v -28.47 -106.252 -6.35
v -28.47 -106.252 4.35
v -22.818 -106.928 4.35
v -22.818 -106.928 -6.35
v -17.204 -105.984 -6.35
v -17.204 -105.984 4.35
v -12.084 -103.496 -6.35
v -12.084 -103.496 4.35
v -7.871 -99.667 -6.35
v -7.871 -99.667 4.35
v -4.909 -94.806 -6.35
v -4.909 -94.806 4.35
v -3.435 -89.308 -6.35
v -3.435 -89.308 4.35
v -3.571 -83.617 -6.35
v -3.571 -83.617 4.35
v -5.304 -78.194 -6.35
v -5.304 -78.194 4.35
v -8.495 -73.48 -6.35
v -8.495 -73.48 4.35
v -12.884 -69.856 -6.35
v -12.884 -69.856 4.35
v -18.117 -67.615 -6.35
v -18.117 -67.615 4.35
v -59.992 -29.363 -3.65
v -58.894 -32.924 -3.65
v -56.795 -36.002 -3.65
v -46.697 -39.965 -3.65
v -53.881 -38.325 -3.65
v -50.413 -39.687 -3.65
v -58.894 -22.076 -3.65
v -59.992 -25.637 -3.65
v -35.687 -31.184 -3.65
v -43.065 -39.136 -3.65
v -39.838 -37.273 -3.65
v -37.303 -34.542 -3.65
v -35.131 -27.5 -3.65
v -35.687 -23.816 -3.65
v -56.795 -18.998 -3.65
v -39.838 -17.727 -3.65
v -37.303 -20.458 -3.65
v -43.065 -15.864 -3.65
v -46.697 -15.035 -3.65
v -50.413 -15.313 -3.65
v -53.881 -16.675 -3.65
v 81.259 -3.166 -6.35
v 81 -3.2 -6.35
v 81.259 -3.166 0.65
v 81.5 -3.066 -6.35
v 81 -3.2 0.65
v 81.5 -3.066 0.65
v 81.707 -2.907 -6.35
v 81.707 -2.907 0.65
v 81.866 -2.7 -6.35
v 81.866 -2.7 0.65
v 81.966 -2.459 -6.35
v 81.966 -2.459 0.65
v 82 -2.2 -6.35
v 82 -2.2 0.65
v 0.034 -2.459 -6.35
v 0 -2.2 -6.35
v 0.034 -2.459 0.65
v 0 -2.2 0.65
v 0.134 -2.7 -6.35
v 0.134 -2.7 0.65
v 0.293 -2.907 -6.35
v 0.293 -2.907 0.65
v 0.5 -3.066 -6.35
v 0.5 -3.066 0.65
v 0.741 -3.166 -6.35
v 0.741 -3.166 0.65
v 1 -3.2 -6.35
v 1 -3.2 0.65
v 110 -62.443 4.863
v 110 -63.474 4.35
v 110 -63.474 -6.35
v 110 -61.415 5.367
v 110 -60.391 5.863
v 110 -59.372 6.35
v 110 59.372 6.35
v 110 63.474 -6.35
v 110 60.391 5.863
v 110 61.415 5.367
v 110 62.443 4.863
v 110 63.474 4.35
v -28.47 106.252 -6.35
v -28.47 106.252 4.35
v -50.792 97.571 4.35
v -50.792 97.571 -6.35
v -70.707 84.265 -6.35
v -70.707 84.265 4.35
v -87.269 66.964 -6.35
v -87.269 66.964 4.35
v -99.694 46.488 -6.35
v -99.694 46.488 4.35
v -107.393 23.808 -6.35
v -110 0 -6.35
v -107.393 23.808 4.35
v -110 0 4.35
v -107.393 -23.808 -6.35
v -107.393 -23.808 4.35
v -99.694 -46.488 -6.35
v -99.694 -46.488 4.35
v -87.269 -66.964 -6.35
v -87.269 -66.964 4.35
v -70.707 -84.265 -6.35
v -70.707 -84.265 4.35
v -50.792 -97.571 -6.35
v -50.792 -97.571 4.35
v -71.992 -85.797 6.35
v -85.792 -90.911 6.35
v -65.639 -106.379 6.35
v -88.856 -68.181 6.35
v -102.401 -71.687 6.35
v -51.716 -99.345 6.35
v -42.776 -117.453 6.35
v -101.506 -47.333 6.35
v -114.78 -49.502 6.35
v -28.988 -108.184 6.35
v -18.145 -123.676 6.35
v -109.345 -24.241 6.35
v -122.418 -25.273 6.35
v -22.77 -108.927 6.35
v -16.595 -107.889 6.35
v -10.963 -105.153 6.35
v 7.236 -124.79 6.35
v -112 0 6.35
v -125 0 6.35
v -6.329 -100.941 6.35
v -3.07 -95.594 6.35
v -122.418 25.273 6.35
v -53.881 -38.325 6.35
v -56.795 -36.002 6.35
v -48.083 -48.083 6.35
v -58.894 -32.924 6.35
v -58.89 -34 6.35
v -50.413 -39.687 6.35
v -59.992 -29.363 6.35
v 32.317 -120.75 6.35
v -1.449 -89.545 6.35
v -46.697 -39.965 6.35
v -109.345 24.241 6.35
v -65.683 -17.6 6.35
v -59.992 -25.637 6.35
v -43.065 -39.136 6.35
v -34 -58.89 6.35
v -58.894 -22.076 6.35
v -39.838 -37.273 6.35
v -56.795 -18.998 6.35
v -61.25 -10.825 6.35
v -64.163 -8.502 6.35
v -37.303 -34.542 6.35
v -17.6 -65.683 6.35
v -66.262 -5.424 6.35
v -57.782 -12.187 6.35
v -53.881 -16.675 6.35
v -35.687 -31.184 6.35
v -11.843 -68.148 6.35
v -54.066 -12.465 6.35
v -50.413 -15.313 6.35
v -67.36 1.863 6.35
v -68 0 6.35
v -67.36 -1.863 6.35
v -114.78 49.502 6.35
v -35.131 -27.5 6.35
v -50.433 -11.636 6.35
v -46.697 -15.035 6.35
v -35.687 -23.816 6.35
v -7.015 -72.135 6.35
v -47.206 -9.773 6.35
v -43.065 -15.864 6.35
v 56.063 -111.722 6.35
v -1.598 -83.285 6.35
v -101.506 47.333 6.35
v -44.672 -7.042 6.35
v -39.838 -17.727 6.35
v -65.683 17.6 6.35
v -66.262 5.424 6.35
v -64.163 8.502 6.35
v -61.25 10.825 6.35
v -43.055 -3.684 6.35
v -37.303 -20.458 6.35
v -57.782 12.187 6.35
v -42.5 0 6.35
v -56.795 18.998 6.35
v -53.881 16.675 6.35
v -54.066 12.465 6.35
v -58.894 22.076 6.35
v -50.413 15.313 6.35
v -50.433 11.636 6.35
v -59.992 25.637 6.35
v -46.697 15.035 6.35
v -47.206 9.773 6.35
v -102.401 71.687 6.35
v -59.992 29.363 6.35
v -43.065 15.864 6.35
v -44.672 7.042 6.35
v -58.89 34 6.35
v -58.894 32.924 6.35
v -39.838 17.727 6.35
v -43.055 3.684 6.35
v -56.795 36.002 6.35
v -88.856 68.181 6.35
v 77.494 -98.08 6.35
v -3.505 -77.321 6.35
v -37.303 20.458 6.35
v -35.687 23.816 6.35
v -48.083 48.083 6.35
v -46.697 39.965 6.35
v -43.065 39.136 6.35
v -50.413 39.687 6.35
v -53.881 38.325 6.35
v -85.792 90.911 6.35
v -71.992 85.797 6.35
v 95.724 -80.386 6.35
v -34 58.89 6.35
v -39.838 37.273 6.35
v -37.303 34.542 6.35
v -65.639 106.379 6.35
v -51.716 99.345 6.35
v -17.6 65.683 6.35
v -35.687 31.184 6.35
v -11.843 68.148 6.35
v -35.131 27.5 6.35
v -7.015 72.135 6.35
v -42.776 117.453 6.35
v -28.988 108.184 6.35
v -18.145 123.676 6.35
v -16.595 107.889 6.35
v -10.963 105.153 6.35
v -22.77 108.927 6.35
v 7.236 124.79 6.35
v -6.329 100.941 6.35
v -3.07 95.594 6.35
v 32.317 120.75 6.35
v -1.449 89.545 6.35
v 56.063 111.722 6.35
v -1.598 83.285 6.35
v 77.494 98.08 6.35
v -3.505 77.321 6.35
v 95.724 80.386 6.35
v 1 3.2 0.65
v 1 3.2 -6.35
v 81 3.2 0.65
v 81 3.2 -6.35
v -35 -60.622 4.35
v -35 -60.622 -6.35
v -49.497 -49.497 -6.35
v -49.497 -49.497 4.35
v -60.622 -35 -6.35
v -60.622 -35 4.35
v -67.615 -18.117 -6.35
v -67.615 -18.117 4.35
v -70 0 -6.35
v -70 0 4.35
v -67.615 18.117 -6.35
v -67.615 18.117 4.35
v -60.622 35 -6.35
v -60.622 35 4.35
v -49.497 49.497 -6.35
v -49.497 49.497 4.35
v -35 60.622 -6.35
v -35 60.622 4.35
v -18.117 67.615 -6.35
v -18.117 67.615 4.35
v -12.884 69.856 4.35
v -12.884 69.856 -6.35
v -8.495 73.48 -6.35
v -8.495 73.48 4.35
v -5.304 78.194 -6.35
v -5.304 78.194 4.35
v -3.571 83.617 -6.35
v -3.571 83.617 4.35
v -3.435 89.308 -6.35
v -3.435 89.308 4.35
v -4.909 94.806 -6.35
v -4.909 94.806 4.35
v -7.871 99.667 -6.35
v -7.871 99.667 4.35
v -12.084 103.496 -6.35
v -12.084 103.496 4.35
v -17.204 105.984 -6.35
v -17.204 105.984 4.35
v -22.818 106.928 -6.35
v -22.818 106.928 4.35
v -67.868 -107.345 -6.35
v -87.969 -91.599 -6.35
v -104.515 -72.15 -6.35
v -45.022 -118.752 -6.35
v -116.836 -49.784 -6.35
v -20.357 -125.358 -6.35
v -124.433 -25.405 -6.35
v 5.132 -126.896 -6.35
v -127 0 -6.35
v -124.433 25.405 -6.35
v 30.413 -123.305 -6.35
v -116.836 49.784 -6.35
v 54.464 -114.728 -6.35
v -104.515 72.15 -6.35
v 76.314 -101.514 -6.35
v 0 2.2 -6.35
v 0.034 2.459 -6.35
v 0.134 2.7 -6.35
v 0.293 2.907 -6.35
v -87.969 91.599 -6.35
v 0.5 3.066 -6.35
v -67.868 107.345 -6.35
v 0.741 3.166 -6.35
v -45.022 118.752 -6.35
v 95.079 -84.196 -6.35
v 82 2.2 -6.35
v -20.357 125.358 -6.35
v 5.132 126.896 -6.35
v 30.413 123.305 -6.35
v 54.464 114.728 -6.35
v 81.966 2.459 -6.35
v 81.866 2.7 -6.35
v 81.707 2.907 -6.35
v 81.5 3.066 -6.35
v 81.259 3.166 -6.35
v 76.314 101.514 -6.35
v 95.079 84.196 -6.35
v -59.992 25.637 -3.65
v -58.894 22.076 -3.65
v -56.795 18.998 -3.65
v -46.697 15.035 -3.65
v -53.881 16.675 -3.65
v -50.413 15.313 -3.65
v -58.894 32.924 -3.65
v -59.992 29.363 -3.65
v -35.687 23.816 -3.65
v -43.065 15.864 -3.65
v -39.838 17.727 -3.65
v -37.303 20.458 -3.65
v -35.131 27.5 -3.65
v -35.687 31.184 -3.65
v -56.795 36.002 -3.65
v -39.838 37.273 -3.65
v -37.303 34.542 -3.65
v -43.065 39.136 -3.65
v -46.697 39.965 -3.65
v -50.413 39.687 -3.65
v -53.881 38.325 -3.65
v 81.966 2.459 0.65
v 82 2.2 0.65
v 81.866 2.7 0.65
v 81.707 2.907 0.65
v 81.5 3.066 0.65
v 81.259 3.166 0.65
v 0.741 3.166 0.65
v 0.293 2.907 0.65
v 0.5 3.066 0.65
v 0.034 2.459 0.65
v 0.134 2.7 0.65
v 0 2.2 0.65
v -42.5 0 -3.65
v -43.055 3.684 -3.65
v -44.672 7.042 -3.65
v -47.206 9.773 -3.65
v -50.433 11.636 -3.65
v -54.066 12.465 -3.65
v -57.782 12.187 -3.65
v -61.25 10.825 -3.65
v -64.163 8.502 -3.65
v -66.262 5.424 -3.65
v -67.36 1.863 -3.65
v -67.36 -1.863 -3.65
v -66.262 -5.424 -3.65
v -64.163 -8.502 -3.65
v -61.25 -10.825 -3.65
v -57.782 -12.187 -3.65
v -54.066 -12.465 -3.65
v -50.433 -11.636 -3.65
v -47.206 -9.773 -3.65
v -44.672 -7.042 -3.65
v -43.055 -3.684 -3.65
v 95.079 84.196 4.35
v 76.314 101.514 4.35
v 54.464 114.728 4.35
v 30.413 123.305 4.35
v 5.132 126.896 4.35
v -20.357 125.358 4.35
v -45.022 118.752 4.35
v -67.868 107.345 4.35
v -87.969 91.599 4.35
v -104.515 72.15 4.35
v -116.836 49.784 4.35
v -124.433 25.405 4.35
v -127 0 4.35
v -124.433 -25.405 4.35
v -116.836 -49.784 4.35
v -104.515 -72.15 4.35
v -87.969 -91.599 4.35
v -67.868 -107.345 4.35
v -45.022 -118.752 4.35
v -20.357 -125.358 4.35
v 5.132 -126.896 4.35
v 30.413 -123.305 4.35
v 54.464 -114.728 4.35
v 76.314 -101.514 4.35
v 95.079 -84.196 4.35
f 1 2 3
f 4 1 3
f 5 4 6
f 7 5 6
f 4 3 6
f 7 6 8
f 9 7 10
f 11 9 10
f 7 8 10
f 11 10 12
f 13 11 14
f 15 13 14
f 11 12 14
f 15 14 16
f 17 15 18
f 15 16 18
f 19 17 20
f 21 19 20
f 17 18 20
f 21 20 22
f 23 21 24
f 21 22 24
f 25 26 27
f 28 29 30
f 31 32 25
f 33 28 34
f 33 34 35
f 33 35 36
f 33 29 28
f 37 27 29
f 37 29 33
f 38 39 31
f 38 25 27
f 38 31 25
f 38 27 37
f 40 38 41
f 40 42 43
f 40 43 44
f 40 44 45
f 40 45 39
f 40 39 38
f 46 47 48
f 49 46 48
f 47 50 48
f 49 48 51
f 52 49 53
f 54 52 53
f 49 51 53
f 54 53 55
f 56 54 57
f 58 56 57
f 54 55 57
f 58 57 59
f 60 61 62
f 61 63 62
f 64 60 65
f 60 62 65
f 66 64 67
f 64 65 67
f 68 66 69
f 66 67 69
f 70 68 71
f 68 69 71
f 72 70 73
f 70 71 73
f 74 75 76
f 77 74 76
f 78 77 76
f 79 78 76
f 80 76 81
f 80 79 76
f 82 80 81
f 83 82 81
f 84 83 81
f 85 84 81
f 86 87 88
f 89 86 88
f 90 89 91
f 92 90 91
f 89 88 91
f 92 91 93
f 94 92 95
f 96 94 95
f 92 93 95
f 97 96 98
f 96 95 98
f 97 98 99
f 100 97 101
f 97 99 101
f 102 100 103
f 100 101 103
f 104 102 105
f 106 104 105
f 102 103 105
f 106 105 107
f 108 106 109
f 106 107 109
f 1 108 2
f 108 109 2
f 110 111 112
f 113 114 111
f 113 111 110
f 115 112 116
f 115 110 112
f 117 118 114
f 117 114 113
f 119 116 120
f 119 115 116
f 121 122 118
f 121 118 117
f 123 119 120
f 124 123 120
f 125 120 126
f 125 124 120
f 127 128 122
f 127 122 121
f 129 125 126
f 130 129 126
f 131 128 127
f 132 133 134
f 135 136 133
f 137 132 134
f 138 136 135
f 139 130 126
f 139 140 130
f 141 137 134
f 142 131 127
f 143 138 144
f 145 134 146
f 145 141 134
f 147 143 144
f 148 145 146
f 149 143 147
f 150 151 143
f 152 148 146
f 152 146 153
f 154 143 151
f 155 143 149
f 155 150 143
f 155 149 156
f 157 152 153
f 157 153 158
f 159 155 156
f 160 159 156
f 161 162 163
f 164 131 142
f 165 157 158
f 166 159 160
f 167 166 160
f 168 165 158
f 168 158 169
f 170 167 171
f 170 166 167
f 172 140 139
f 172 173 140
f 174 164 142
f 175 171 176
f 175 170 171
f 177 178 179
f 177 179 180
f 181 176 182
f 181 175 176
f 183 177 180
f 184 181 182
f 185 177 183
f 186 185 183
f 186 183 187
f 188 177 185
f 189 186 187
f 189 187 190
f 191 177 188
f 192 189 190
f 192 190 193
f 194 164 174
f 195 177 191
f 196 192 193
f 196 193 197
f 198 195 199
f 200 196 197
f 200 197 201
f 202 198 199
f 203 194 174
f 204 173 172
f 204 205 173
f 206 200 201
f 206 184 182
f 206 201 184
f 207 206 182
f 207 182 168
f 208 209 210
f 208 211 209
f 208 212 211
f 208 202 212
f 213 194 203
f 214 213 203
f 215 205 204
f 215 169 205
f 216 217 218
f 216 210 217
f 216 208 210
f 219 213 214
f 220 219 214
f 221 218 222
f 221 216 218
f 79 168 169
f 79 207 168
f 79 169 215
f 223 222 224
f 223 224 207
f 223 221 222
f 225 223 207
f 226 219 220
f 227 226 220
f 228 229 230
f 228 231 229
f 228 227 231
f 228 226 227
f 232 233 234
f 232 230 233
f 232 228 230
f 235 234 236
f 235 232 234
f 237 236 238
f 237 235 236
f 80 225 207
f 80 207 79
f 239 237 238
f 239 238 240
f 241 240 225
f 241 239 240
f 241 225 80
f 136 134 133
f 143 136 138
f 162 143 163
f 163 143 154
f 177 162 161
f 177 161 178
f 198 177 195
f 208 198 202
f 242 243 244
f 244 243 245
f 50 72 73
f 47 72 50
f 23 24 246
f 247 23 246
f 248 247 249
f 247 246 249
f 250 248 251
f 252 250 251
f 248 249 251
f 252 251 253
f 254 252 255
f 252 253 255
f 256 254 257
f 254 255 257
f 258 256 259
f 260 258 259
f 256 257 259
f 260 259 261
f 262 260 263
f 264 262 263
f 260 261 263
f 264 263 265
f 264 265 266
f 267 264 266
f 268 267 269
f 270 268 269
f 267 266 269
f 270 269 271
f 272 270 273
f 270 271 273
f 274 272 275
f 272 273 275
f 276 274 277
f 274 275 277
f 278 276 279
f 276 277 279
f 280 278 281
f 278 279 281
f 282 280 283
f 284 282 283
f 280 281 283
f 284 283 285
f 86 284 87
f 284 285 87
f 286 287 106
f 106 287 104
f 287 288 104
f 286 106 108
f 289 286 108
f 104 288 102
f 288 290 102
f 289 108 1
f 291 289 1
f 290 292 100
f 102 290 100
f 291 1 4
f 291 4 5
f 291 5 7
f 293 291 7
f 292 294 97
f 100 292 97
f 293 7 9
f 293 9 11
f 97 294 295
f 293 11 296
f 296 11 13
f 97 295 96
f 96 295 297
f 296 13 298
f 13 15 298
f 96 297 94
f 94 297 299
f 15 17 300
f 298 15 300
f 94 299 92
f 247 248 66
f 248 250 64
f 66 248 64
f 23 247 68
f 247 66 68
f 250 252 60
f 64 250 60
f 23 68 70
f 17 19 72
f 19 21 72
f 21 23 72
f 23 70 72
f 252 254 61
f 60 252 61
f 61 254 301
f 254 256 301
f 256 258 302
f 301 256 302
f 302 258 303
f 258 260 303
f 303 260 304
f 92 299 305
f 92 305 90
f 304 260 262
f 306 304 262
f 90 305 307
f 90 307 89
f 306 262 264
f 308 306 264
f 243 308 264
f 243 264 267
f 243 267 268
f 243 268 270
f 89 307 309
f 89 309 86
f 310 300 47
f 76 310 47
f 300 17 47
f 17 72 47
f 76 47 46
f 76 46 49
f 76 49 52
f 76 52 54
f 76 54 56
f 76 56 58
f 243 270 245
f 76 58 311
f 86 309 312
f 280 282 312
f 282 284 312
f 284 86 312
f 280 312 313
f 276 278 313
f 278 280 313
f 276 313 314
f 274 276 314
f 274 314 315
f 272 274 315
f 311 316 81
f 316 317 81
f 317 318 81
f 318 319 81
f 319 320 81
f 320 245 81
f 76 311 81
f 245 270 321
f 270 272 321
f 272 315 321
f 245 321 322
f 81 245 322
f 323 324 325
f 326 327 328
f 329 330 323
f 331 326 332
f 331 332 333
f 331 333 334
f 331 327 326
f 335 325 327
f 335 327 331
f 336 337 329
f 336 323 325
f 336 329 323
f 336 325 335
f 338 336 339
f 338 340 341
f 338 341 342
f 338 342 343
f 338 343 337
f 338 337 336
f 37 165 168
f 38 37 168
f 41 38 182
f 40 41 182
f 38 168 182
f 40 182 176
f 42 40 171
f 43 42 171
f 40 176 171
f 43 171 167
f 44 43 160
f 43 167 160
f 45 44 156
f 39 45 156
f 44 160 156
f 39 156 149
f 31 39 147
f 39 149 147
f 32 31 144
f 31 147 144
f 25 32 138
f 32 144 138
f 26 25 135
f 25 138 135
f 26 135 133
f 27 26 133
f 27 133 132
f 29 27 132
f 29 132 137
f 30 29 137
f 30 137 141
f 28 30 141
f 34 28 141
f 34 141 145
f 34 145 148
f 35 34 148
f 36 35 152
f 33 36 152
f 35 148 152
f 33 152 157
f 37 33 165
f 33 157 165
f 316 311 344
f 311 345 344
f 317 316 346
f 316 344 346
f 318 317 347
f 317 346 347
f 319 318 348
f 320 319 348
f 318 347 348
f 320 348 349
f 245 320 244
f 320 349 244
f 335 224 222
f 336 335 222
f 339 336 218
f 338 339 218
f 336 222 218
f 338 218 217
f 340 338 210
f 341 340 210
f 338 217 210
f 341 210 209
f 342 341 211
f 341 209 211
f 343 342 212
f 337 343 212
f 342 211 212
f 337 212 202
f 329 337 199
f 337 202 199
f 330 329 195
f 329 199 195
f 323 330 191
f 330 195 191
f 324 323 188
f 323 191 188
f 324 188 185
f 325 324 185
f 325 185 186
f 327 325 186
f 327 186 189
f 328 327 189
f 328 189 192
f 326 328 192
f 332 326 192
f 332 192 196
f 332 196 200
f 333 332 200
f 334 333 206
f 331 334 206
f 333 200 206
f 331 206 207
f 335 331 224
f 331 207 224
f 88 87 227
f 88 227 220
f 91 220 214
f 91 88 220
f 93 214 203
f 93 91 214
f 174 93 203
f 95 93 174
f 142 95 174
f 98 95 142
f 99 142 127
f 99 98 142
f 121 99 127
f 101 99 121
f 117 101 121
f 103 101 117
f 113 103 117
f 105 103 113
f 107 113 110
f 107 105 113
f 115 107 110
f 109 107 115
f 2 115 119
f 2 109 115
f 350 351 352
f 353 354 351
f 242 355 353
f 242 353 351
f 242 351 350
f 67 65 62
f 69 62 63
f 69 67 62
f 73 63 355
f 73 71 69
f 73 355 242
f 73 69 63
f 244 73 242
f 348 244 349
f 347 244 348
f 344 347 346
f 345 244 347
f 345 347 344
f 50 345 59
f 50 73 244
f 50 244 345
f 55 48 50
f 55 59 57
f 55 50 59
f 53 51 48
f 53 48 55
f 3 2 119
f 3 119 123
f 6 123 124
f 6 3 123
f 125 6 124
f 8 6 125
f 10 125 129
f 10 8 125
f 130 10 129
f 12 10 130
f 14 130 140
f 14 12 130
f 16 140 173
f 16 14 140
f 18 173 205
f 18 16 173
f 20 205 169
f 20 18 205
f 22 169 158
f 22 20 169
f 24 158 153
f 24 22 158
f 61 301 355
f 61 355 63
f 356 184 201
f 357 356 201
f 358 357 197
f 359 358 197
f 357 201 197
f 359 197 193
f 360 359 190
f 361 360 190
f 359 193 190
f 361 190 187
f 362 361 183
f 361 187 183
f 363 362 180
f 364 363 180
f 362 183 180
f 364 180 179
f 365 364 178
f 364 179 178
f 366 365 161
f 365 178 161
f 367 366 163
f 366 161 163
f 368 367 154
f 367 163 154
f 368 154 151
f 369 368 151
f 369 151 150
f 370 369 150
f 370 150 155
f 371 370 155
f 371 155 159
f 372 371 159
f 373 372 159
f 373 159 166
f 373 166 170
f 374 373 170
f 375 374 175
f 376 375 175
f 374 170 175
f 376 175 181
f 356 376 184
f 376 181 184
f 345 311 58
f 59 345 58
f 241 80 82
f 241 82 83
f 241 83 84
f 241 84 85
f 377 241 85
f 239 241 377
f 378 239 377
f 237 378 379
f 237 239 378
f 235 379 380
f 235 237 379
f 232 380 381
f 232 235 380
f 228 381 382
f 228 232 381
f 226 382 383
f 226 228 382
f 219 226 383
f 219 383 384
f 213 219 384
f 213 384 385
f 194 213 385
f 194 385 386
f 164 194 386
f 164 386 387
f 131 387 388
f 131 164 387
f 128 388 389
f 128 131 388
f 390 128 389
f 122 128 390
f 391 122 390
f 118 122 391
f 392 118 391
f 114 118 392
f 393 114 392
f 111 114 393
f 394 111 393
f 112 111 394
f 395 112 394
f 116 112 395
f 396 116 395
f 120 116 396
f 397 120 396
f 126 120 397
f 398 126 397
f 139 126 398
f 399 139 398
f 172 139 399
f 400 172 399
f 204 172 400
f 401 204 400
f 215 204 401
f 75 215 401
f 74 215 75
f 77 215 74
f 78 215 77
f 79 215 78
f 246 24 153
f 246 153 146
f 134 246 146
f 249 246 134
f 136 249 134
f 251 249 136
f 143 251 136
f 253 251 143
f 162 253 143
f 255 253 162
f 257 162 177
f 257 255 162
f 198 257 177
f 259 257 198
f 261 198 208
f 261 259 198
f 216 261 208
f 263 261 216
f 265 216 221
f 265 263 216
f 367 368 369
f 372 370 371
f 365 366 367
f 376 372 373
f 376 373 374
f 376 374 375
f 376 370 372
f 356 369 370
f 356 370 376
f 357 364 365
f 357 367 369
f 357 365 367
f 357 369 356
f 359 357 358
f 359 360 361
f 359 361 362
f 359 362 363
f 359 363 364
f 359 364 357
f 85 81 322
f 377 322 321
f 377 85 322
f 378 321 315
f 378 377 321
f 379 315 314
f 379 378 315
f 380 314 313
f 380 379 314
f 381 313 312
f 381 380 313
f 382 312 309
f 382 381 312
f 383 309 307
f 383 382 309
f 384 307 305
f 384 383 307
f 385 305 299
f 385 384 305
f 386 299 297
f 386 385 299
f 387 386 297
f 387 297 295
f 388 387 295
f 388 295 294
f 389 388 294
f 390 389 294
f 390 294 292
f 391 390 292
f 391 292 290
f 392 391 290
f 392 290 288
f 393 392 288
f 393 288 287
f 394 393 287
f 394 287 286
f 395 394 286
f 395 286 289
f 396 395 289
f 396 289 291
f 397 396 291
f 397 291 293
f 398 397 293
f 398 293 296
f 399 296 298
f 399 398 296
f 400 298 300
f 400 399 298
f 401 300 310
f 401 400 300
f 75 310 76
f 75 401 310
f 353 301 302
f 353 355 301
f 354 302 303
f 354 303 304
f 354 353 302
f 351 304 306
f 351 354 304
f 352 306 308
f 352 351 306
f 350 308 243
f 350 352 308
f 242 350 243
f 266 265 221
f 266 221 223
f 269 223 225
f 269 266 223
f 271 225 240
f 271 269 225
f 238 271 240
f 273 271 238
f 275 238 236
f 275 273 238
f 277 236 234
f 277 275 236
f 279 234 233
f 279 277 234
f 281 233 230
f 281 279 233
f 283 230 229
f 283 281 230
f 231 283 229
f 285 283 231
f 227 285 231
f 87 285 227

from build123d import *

# Parameters (mm, degrees)
F0_R      = 127
F1_DEPTH  = 6.35
F4_DEPTH  = 12.7
F5_R      = 12.5
F6_DEPTH  = 10
F8_SIZE   = 2
F9_W      = 28.838306
F9_H      = 155.121999
F10_DEPTH = 12.7
F11_W     = 82
F11_H     = 6.4
F12_DEPTH = 7
F13_R     = 1


with BuildPart() as f1:
    # F0 (on Top) → F1 (new body, symmetric)
    with BuildSketch(Plane.XY):
        Circle(F0_R)
    extrude(amount=F1_DEPTH, both=True)

    # F3 (on face) → F4 (cut, through all)
    with BuildSketch(Plane.XY.offset(6.35)):
        with BuildLine():
            ThreePointArc((-18.117333, -67.614808), (-70, 0), (-18.117333, 67.614808))
            ThreePointArc((-18.117333, 67.614808), (-3.975198, 92.109705), (-28.470095, 106.251841))
            ThreePointArc((-28.470095, 106.251841), (-110, 0), (-28.470095, -106.251841))
            ThreePointArc((-28.470095, -106.251841), (-3.975198, -92.109705), (-18.117333, -67.614808))
        make_face()
    extrude(amount=-F4_DEPTH, mode=Mode.SUBTRACT)

    # F5 (on face) → F6 (cut)
    with BuildSketch(Plane.XY.offset(6.35)):
        with Locations((-47.631397, 27.5)):
            Circle(F5_R)
        with Locations((-55, 0)):
            Circle(F5_R)
        with Locations((-47.631397, -27.5)):
            Circle(F5_R)
    extrude(amount=-F6_DEPTH, mode=Mode.SUBTRACT)

    # F8
    f8_edges = [f1.edges().sort_by_distance(p)[0] for p in [
        (-110, 0, 6.35),
        (-127, 0, 6.35),
    ]]
    chamfer(f8_edges, length=F8_SIZE)

    # F9 (on face) → F10 (cut, through all)
    with BuildSketch(Plane.XY.offset(6.35)):
        with Locations((124.419153, -2.012827)):
            Rectangle(F9_W, F9_H)
    extrude(amount=-F10_DEPTH, mode=Mode.SUBTRACT)

    # F11 (on face) → F12 (cut)
    with BuildSketch(Plane(origin=(0, 0, -6.35), x_dir=(1, 0, 0), z_dir=(0, 0, -1))):
        with Locations((41, 0)):
            Rectangle(F11_W, F11_H)
    extrude(amount=-F12_DEPTH, mode=Mode.SUBTRACT)

    # F13
    f13_edges = [f1.edges().sort_by_distance(p)[0] for p in [
        (0, -3.2, -2.85),
        (0, 3.2, -2.85),
        (82, 3.2, -2.85),
        (82, -3.2, -2.85),
    ]]
    fillet(f13_edges, radius=F13_R)


solid = f1.part
